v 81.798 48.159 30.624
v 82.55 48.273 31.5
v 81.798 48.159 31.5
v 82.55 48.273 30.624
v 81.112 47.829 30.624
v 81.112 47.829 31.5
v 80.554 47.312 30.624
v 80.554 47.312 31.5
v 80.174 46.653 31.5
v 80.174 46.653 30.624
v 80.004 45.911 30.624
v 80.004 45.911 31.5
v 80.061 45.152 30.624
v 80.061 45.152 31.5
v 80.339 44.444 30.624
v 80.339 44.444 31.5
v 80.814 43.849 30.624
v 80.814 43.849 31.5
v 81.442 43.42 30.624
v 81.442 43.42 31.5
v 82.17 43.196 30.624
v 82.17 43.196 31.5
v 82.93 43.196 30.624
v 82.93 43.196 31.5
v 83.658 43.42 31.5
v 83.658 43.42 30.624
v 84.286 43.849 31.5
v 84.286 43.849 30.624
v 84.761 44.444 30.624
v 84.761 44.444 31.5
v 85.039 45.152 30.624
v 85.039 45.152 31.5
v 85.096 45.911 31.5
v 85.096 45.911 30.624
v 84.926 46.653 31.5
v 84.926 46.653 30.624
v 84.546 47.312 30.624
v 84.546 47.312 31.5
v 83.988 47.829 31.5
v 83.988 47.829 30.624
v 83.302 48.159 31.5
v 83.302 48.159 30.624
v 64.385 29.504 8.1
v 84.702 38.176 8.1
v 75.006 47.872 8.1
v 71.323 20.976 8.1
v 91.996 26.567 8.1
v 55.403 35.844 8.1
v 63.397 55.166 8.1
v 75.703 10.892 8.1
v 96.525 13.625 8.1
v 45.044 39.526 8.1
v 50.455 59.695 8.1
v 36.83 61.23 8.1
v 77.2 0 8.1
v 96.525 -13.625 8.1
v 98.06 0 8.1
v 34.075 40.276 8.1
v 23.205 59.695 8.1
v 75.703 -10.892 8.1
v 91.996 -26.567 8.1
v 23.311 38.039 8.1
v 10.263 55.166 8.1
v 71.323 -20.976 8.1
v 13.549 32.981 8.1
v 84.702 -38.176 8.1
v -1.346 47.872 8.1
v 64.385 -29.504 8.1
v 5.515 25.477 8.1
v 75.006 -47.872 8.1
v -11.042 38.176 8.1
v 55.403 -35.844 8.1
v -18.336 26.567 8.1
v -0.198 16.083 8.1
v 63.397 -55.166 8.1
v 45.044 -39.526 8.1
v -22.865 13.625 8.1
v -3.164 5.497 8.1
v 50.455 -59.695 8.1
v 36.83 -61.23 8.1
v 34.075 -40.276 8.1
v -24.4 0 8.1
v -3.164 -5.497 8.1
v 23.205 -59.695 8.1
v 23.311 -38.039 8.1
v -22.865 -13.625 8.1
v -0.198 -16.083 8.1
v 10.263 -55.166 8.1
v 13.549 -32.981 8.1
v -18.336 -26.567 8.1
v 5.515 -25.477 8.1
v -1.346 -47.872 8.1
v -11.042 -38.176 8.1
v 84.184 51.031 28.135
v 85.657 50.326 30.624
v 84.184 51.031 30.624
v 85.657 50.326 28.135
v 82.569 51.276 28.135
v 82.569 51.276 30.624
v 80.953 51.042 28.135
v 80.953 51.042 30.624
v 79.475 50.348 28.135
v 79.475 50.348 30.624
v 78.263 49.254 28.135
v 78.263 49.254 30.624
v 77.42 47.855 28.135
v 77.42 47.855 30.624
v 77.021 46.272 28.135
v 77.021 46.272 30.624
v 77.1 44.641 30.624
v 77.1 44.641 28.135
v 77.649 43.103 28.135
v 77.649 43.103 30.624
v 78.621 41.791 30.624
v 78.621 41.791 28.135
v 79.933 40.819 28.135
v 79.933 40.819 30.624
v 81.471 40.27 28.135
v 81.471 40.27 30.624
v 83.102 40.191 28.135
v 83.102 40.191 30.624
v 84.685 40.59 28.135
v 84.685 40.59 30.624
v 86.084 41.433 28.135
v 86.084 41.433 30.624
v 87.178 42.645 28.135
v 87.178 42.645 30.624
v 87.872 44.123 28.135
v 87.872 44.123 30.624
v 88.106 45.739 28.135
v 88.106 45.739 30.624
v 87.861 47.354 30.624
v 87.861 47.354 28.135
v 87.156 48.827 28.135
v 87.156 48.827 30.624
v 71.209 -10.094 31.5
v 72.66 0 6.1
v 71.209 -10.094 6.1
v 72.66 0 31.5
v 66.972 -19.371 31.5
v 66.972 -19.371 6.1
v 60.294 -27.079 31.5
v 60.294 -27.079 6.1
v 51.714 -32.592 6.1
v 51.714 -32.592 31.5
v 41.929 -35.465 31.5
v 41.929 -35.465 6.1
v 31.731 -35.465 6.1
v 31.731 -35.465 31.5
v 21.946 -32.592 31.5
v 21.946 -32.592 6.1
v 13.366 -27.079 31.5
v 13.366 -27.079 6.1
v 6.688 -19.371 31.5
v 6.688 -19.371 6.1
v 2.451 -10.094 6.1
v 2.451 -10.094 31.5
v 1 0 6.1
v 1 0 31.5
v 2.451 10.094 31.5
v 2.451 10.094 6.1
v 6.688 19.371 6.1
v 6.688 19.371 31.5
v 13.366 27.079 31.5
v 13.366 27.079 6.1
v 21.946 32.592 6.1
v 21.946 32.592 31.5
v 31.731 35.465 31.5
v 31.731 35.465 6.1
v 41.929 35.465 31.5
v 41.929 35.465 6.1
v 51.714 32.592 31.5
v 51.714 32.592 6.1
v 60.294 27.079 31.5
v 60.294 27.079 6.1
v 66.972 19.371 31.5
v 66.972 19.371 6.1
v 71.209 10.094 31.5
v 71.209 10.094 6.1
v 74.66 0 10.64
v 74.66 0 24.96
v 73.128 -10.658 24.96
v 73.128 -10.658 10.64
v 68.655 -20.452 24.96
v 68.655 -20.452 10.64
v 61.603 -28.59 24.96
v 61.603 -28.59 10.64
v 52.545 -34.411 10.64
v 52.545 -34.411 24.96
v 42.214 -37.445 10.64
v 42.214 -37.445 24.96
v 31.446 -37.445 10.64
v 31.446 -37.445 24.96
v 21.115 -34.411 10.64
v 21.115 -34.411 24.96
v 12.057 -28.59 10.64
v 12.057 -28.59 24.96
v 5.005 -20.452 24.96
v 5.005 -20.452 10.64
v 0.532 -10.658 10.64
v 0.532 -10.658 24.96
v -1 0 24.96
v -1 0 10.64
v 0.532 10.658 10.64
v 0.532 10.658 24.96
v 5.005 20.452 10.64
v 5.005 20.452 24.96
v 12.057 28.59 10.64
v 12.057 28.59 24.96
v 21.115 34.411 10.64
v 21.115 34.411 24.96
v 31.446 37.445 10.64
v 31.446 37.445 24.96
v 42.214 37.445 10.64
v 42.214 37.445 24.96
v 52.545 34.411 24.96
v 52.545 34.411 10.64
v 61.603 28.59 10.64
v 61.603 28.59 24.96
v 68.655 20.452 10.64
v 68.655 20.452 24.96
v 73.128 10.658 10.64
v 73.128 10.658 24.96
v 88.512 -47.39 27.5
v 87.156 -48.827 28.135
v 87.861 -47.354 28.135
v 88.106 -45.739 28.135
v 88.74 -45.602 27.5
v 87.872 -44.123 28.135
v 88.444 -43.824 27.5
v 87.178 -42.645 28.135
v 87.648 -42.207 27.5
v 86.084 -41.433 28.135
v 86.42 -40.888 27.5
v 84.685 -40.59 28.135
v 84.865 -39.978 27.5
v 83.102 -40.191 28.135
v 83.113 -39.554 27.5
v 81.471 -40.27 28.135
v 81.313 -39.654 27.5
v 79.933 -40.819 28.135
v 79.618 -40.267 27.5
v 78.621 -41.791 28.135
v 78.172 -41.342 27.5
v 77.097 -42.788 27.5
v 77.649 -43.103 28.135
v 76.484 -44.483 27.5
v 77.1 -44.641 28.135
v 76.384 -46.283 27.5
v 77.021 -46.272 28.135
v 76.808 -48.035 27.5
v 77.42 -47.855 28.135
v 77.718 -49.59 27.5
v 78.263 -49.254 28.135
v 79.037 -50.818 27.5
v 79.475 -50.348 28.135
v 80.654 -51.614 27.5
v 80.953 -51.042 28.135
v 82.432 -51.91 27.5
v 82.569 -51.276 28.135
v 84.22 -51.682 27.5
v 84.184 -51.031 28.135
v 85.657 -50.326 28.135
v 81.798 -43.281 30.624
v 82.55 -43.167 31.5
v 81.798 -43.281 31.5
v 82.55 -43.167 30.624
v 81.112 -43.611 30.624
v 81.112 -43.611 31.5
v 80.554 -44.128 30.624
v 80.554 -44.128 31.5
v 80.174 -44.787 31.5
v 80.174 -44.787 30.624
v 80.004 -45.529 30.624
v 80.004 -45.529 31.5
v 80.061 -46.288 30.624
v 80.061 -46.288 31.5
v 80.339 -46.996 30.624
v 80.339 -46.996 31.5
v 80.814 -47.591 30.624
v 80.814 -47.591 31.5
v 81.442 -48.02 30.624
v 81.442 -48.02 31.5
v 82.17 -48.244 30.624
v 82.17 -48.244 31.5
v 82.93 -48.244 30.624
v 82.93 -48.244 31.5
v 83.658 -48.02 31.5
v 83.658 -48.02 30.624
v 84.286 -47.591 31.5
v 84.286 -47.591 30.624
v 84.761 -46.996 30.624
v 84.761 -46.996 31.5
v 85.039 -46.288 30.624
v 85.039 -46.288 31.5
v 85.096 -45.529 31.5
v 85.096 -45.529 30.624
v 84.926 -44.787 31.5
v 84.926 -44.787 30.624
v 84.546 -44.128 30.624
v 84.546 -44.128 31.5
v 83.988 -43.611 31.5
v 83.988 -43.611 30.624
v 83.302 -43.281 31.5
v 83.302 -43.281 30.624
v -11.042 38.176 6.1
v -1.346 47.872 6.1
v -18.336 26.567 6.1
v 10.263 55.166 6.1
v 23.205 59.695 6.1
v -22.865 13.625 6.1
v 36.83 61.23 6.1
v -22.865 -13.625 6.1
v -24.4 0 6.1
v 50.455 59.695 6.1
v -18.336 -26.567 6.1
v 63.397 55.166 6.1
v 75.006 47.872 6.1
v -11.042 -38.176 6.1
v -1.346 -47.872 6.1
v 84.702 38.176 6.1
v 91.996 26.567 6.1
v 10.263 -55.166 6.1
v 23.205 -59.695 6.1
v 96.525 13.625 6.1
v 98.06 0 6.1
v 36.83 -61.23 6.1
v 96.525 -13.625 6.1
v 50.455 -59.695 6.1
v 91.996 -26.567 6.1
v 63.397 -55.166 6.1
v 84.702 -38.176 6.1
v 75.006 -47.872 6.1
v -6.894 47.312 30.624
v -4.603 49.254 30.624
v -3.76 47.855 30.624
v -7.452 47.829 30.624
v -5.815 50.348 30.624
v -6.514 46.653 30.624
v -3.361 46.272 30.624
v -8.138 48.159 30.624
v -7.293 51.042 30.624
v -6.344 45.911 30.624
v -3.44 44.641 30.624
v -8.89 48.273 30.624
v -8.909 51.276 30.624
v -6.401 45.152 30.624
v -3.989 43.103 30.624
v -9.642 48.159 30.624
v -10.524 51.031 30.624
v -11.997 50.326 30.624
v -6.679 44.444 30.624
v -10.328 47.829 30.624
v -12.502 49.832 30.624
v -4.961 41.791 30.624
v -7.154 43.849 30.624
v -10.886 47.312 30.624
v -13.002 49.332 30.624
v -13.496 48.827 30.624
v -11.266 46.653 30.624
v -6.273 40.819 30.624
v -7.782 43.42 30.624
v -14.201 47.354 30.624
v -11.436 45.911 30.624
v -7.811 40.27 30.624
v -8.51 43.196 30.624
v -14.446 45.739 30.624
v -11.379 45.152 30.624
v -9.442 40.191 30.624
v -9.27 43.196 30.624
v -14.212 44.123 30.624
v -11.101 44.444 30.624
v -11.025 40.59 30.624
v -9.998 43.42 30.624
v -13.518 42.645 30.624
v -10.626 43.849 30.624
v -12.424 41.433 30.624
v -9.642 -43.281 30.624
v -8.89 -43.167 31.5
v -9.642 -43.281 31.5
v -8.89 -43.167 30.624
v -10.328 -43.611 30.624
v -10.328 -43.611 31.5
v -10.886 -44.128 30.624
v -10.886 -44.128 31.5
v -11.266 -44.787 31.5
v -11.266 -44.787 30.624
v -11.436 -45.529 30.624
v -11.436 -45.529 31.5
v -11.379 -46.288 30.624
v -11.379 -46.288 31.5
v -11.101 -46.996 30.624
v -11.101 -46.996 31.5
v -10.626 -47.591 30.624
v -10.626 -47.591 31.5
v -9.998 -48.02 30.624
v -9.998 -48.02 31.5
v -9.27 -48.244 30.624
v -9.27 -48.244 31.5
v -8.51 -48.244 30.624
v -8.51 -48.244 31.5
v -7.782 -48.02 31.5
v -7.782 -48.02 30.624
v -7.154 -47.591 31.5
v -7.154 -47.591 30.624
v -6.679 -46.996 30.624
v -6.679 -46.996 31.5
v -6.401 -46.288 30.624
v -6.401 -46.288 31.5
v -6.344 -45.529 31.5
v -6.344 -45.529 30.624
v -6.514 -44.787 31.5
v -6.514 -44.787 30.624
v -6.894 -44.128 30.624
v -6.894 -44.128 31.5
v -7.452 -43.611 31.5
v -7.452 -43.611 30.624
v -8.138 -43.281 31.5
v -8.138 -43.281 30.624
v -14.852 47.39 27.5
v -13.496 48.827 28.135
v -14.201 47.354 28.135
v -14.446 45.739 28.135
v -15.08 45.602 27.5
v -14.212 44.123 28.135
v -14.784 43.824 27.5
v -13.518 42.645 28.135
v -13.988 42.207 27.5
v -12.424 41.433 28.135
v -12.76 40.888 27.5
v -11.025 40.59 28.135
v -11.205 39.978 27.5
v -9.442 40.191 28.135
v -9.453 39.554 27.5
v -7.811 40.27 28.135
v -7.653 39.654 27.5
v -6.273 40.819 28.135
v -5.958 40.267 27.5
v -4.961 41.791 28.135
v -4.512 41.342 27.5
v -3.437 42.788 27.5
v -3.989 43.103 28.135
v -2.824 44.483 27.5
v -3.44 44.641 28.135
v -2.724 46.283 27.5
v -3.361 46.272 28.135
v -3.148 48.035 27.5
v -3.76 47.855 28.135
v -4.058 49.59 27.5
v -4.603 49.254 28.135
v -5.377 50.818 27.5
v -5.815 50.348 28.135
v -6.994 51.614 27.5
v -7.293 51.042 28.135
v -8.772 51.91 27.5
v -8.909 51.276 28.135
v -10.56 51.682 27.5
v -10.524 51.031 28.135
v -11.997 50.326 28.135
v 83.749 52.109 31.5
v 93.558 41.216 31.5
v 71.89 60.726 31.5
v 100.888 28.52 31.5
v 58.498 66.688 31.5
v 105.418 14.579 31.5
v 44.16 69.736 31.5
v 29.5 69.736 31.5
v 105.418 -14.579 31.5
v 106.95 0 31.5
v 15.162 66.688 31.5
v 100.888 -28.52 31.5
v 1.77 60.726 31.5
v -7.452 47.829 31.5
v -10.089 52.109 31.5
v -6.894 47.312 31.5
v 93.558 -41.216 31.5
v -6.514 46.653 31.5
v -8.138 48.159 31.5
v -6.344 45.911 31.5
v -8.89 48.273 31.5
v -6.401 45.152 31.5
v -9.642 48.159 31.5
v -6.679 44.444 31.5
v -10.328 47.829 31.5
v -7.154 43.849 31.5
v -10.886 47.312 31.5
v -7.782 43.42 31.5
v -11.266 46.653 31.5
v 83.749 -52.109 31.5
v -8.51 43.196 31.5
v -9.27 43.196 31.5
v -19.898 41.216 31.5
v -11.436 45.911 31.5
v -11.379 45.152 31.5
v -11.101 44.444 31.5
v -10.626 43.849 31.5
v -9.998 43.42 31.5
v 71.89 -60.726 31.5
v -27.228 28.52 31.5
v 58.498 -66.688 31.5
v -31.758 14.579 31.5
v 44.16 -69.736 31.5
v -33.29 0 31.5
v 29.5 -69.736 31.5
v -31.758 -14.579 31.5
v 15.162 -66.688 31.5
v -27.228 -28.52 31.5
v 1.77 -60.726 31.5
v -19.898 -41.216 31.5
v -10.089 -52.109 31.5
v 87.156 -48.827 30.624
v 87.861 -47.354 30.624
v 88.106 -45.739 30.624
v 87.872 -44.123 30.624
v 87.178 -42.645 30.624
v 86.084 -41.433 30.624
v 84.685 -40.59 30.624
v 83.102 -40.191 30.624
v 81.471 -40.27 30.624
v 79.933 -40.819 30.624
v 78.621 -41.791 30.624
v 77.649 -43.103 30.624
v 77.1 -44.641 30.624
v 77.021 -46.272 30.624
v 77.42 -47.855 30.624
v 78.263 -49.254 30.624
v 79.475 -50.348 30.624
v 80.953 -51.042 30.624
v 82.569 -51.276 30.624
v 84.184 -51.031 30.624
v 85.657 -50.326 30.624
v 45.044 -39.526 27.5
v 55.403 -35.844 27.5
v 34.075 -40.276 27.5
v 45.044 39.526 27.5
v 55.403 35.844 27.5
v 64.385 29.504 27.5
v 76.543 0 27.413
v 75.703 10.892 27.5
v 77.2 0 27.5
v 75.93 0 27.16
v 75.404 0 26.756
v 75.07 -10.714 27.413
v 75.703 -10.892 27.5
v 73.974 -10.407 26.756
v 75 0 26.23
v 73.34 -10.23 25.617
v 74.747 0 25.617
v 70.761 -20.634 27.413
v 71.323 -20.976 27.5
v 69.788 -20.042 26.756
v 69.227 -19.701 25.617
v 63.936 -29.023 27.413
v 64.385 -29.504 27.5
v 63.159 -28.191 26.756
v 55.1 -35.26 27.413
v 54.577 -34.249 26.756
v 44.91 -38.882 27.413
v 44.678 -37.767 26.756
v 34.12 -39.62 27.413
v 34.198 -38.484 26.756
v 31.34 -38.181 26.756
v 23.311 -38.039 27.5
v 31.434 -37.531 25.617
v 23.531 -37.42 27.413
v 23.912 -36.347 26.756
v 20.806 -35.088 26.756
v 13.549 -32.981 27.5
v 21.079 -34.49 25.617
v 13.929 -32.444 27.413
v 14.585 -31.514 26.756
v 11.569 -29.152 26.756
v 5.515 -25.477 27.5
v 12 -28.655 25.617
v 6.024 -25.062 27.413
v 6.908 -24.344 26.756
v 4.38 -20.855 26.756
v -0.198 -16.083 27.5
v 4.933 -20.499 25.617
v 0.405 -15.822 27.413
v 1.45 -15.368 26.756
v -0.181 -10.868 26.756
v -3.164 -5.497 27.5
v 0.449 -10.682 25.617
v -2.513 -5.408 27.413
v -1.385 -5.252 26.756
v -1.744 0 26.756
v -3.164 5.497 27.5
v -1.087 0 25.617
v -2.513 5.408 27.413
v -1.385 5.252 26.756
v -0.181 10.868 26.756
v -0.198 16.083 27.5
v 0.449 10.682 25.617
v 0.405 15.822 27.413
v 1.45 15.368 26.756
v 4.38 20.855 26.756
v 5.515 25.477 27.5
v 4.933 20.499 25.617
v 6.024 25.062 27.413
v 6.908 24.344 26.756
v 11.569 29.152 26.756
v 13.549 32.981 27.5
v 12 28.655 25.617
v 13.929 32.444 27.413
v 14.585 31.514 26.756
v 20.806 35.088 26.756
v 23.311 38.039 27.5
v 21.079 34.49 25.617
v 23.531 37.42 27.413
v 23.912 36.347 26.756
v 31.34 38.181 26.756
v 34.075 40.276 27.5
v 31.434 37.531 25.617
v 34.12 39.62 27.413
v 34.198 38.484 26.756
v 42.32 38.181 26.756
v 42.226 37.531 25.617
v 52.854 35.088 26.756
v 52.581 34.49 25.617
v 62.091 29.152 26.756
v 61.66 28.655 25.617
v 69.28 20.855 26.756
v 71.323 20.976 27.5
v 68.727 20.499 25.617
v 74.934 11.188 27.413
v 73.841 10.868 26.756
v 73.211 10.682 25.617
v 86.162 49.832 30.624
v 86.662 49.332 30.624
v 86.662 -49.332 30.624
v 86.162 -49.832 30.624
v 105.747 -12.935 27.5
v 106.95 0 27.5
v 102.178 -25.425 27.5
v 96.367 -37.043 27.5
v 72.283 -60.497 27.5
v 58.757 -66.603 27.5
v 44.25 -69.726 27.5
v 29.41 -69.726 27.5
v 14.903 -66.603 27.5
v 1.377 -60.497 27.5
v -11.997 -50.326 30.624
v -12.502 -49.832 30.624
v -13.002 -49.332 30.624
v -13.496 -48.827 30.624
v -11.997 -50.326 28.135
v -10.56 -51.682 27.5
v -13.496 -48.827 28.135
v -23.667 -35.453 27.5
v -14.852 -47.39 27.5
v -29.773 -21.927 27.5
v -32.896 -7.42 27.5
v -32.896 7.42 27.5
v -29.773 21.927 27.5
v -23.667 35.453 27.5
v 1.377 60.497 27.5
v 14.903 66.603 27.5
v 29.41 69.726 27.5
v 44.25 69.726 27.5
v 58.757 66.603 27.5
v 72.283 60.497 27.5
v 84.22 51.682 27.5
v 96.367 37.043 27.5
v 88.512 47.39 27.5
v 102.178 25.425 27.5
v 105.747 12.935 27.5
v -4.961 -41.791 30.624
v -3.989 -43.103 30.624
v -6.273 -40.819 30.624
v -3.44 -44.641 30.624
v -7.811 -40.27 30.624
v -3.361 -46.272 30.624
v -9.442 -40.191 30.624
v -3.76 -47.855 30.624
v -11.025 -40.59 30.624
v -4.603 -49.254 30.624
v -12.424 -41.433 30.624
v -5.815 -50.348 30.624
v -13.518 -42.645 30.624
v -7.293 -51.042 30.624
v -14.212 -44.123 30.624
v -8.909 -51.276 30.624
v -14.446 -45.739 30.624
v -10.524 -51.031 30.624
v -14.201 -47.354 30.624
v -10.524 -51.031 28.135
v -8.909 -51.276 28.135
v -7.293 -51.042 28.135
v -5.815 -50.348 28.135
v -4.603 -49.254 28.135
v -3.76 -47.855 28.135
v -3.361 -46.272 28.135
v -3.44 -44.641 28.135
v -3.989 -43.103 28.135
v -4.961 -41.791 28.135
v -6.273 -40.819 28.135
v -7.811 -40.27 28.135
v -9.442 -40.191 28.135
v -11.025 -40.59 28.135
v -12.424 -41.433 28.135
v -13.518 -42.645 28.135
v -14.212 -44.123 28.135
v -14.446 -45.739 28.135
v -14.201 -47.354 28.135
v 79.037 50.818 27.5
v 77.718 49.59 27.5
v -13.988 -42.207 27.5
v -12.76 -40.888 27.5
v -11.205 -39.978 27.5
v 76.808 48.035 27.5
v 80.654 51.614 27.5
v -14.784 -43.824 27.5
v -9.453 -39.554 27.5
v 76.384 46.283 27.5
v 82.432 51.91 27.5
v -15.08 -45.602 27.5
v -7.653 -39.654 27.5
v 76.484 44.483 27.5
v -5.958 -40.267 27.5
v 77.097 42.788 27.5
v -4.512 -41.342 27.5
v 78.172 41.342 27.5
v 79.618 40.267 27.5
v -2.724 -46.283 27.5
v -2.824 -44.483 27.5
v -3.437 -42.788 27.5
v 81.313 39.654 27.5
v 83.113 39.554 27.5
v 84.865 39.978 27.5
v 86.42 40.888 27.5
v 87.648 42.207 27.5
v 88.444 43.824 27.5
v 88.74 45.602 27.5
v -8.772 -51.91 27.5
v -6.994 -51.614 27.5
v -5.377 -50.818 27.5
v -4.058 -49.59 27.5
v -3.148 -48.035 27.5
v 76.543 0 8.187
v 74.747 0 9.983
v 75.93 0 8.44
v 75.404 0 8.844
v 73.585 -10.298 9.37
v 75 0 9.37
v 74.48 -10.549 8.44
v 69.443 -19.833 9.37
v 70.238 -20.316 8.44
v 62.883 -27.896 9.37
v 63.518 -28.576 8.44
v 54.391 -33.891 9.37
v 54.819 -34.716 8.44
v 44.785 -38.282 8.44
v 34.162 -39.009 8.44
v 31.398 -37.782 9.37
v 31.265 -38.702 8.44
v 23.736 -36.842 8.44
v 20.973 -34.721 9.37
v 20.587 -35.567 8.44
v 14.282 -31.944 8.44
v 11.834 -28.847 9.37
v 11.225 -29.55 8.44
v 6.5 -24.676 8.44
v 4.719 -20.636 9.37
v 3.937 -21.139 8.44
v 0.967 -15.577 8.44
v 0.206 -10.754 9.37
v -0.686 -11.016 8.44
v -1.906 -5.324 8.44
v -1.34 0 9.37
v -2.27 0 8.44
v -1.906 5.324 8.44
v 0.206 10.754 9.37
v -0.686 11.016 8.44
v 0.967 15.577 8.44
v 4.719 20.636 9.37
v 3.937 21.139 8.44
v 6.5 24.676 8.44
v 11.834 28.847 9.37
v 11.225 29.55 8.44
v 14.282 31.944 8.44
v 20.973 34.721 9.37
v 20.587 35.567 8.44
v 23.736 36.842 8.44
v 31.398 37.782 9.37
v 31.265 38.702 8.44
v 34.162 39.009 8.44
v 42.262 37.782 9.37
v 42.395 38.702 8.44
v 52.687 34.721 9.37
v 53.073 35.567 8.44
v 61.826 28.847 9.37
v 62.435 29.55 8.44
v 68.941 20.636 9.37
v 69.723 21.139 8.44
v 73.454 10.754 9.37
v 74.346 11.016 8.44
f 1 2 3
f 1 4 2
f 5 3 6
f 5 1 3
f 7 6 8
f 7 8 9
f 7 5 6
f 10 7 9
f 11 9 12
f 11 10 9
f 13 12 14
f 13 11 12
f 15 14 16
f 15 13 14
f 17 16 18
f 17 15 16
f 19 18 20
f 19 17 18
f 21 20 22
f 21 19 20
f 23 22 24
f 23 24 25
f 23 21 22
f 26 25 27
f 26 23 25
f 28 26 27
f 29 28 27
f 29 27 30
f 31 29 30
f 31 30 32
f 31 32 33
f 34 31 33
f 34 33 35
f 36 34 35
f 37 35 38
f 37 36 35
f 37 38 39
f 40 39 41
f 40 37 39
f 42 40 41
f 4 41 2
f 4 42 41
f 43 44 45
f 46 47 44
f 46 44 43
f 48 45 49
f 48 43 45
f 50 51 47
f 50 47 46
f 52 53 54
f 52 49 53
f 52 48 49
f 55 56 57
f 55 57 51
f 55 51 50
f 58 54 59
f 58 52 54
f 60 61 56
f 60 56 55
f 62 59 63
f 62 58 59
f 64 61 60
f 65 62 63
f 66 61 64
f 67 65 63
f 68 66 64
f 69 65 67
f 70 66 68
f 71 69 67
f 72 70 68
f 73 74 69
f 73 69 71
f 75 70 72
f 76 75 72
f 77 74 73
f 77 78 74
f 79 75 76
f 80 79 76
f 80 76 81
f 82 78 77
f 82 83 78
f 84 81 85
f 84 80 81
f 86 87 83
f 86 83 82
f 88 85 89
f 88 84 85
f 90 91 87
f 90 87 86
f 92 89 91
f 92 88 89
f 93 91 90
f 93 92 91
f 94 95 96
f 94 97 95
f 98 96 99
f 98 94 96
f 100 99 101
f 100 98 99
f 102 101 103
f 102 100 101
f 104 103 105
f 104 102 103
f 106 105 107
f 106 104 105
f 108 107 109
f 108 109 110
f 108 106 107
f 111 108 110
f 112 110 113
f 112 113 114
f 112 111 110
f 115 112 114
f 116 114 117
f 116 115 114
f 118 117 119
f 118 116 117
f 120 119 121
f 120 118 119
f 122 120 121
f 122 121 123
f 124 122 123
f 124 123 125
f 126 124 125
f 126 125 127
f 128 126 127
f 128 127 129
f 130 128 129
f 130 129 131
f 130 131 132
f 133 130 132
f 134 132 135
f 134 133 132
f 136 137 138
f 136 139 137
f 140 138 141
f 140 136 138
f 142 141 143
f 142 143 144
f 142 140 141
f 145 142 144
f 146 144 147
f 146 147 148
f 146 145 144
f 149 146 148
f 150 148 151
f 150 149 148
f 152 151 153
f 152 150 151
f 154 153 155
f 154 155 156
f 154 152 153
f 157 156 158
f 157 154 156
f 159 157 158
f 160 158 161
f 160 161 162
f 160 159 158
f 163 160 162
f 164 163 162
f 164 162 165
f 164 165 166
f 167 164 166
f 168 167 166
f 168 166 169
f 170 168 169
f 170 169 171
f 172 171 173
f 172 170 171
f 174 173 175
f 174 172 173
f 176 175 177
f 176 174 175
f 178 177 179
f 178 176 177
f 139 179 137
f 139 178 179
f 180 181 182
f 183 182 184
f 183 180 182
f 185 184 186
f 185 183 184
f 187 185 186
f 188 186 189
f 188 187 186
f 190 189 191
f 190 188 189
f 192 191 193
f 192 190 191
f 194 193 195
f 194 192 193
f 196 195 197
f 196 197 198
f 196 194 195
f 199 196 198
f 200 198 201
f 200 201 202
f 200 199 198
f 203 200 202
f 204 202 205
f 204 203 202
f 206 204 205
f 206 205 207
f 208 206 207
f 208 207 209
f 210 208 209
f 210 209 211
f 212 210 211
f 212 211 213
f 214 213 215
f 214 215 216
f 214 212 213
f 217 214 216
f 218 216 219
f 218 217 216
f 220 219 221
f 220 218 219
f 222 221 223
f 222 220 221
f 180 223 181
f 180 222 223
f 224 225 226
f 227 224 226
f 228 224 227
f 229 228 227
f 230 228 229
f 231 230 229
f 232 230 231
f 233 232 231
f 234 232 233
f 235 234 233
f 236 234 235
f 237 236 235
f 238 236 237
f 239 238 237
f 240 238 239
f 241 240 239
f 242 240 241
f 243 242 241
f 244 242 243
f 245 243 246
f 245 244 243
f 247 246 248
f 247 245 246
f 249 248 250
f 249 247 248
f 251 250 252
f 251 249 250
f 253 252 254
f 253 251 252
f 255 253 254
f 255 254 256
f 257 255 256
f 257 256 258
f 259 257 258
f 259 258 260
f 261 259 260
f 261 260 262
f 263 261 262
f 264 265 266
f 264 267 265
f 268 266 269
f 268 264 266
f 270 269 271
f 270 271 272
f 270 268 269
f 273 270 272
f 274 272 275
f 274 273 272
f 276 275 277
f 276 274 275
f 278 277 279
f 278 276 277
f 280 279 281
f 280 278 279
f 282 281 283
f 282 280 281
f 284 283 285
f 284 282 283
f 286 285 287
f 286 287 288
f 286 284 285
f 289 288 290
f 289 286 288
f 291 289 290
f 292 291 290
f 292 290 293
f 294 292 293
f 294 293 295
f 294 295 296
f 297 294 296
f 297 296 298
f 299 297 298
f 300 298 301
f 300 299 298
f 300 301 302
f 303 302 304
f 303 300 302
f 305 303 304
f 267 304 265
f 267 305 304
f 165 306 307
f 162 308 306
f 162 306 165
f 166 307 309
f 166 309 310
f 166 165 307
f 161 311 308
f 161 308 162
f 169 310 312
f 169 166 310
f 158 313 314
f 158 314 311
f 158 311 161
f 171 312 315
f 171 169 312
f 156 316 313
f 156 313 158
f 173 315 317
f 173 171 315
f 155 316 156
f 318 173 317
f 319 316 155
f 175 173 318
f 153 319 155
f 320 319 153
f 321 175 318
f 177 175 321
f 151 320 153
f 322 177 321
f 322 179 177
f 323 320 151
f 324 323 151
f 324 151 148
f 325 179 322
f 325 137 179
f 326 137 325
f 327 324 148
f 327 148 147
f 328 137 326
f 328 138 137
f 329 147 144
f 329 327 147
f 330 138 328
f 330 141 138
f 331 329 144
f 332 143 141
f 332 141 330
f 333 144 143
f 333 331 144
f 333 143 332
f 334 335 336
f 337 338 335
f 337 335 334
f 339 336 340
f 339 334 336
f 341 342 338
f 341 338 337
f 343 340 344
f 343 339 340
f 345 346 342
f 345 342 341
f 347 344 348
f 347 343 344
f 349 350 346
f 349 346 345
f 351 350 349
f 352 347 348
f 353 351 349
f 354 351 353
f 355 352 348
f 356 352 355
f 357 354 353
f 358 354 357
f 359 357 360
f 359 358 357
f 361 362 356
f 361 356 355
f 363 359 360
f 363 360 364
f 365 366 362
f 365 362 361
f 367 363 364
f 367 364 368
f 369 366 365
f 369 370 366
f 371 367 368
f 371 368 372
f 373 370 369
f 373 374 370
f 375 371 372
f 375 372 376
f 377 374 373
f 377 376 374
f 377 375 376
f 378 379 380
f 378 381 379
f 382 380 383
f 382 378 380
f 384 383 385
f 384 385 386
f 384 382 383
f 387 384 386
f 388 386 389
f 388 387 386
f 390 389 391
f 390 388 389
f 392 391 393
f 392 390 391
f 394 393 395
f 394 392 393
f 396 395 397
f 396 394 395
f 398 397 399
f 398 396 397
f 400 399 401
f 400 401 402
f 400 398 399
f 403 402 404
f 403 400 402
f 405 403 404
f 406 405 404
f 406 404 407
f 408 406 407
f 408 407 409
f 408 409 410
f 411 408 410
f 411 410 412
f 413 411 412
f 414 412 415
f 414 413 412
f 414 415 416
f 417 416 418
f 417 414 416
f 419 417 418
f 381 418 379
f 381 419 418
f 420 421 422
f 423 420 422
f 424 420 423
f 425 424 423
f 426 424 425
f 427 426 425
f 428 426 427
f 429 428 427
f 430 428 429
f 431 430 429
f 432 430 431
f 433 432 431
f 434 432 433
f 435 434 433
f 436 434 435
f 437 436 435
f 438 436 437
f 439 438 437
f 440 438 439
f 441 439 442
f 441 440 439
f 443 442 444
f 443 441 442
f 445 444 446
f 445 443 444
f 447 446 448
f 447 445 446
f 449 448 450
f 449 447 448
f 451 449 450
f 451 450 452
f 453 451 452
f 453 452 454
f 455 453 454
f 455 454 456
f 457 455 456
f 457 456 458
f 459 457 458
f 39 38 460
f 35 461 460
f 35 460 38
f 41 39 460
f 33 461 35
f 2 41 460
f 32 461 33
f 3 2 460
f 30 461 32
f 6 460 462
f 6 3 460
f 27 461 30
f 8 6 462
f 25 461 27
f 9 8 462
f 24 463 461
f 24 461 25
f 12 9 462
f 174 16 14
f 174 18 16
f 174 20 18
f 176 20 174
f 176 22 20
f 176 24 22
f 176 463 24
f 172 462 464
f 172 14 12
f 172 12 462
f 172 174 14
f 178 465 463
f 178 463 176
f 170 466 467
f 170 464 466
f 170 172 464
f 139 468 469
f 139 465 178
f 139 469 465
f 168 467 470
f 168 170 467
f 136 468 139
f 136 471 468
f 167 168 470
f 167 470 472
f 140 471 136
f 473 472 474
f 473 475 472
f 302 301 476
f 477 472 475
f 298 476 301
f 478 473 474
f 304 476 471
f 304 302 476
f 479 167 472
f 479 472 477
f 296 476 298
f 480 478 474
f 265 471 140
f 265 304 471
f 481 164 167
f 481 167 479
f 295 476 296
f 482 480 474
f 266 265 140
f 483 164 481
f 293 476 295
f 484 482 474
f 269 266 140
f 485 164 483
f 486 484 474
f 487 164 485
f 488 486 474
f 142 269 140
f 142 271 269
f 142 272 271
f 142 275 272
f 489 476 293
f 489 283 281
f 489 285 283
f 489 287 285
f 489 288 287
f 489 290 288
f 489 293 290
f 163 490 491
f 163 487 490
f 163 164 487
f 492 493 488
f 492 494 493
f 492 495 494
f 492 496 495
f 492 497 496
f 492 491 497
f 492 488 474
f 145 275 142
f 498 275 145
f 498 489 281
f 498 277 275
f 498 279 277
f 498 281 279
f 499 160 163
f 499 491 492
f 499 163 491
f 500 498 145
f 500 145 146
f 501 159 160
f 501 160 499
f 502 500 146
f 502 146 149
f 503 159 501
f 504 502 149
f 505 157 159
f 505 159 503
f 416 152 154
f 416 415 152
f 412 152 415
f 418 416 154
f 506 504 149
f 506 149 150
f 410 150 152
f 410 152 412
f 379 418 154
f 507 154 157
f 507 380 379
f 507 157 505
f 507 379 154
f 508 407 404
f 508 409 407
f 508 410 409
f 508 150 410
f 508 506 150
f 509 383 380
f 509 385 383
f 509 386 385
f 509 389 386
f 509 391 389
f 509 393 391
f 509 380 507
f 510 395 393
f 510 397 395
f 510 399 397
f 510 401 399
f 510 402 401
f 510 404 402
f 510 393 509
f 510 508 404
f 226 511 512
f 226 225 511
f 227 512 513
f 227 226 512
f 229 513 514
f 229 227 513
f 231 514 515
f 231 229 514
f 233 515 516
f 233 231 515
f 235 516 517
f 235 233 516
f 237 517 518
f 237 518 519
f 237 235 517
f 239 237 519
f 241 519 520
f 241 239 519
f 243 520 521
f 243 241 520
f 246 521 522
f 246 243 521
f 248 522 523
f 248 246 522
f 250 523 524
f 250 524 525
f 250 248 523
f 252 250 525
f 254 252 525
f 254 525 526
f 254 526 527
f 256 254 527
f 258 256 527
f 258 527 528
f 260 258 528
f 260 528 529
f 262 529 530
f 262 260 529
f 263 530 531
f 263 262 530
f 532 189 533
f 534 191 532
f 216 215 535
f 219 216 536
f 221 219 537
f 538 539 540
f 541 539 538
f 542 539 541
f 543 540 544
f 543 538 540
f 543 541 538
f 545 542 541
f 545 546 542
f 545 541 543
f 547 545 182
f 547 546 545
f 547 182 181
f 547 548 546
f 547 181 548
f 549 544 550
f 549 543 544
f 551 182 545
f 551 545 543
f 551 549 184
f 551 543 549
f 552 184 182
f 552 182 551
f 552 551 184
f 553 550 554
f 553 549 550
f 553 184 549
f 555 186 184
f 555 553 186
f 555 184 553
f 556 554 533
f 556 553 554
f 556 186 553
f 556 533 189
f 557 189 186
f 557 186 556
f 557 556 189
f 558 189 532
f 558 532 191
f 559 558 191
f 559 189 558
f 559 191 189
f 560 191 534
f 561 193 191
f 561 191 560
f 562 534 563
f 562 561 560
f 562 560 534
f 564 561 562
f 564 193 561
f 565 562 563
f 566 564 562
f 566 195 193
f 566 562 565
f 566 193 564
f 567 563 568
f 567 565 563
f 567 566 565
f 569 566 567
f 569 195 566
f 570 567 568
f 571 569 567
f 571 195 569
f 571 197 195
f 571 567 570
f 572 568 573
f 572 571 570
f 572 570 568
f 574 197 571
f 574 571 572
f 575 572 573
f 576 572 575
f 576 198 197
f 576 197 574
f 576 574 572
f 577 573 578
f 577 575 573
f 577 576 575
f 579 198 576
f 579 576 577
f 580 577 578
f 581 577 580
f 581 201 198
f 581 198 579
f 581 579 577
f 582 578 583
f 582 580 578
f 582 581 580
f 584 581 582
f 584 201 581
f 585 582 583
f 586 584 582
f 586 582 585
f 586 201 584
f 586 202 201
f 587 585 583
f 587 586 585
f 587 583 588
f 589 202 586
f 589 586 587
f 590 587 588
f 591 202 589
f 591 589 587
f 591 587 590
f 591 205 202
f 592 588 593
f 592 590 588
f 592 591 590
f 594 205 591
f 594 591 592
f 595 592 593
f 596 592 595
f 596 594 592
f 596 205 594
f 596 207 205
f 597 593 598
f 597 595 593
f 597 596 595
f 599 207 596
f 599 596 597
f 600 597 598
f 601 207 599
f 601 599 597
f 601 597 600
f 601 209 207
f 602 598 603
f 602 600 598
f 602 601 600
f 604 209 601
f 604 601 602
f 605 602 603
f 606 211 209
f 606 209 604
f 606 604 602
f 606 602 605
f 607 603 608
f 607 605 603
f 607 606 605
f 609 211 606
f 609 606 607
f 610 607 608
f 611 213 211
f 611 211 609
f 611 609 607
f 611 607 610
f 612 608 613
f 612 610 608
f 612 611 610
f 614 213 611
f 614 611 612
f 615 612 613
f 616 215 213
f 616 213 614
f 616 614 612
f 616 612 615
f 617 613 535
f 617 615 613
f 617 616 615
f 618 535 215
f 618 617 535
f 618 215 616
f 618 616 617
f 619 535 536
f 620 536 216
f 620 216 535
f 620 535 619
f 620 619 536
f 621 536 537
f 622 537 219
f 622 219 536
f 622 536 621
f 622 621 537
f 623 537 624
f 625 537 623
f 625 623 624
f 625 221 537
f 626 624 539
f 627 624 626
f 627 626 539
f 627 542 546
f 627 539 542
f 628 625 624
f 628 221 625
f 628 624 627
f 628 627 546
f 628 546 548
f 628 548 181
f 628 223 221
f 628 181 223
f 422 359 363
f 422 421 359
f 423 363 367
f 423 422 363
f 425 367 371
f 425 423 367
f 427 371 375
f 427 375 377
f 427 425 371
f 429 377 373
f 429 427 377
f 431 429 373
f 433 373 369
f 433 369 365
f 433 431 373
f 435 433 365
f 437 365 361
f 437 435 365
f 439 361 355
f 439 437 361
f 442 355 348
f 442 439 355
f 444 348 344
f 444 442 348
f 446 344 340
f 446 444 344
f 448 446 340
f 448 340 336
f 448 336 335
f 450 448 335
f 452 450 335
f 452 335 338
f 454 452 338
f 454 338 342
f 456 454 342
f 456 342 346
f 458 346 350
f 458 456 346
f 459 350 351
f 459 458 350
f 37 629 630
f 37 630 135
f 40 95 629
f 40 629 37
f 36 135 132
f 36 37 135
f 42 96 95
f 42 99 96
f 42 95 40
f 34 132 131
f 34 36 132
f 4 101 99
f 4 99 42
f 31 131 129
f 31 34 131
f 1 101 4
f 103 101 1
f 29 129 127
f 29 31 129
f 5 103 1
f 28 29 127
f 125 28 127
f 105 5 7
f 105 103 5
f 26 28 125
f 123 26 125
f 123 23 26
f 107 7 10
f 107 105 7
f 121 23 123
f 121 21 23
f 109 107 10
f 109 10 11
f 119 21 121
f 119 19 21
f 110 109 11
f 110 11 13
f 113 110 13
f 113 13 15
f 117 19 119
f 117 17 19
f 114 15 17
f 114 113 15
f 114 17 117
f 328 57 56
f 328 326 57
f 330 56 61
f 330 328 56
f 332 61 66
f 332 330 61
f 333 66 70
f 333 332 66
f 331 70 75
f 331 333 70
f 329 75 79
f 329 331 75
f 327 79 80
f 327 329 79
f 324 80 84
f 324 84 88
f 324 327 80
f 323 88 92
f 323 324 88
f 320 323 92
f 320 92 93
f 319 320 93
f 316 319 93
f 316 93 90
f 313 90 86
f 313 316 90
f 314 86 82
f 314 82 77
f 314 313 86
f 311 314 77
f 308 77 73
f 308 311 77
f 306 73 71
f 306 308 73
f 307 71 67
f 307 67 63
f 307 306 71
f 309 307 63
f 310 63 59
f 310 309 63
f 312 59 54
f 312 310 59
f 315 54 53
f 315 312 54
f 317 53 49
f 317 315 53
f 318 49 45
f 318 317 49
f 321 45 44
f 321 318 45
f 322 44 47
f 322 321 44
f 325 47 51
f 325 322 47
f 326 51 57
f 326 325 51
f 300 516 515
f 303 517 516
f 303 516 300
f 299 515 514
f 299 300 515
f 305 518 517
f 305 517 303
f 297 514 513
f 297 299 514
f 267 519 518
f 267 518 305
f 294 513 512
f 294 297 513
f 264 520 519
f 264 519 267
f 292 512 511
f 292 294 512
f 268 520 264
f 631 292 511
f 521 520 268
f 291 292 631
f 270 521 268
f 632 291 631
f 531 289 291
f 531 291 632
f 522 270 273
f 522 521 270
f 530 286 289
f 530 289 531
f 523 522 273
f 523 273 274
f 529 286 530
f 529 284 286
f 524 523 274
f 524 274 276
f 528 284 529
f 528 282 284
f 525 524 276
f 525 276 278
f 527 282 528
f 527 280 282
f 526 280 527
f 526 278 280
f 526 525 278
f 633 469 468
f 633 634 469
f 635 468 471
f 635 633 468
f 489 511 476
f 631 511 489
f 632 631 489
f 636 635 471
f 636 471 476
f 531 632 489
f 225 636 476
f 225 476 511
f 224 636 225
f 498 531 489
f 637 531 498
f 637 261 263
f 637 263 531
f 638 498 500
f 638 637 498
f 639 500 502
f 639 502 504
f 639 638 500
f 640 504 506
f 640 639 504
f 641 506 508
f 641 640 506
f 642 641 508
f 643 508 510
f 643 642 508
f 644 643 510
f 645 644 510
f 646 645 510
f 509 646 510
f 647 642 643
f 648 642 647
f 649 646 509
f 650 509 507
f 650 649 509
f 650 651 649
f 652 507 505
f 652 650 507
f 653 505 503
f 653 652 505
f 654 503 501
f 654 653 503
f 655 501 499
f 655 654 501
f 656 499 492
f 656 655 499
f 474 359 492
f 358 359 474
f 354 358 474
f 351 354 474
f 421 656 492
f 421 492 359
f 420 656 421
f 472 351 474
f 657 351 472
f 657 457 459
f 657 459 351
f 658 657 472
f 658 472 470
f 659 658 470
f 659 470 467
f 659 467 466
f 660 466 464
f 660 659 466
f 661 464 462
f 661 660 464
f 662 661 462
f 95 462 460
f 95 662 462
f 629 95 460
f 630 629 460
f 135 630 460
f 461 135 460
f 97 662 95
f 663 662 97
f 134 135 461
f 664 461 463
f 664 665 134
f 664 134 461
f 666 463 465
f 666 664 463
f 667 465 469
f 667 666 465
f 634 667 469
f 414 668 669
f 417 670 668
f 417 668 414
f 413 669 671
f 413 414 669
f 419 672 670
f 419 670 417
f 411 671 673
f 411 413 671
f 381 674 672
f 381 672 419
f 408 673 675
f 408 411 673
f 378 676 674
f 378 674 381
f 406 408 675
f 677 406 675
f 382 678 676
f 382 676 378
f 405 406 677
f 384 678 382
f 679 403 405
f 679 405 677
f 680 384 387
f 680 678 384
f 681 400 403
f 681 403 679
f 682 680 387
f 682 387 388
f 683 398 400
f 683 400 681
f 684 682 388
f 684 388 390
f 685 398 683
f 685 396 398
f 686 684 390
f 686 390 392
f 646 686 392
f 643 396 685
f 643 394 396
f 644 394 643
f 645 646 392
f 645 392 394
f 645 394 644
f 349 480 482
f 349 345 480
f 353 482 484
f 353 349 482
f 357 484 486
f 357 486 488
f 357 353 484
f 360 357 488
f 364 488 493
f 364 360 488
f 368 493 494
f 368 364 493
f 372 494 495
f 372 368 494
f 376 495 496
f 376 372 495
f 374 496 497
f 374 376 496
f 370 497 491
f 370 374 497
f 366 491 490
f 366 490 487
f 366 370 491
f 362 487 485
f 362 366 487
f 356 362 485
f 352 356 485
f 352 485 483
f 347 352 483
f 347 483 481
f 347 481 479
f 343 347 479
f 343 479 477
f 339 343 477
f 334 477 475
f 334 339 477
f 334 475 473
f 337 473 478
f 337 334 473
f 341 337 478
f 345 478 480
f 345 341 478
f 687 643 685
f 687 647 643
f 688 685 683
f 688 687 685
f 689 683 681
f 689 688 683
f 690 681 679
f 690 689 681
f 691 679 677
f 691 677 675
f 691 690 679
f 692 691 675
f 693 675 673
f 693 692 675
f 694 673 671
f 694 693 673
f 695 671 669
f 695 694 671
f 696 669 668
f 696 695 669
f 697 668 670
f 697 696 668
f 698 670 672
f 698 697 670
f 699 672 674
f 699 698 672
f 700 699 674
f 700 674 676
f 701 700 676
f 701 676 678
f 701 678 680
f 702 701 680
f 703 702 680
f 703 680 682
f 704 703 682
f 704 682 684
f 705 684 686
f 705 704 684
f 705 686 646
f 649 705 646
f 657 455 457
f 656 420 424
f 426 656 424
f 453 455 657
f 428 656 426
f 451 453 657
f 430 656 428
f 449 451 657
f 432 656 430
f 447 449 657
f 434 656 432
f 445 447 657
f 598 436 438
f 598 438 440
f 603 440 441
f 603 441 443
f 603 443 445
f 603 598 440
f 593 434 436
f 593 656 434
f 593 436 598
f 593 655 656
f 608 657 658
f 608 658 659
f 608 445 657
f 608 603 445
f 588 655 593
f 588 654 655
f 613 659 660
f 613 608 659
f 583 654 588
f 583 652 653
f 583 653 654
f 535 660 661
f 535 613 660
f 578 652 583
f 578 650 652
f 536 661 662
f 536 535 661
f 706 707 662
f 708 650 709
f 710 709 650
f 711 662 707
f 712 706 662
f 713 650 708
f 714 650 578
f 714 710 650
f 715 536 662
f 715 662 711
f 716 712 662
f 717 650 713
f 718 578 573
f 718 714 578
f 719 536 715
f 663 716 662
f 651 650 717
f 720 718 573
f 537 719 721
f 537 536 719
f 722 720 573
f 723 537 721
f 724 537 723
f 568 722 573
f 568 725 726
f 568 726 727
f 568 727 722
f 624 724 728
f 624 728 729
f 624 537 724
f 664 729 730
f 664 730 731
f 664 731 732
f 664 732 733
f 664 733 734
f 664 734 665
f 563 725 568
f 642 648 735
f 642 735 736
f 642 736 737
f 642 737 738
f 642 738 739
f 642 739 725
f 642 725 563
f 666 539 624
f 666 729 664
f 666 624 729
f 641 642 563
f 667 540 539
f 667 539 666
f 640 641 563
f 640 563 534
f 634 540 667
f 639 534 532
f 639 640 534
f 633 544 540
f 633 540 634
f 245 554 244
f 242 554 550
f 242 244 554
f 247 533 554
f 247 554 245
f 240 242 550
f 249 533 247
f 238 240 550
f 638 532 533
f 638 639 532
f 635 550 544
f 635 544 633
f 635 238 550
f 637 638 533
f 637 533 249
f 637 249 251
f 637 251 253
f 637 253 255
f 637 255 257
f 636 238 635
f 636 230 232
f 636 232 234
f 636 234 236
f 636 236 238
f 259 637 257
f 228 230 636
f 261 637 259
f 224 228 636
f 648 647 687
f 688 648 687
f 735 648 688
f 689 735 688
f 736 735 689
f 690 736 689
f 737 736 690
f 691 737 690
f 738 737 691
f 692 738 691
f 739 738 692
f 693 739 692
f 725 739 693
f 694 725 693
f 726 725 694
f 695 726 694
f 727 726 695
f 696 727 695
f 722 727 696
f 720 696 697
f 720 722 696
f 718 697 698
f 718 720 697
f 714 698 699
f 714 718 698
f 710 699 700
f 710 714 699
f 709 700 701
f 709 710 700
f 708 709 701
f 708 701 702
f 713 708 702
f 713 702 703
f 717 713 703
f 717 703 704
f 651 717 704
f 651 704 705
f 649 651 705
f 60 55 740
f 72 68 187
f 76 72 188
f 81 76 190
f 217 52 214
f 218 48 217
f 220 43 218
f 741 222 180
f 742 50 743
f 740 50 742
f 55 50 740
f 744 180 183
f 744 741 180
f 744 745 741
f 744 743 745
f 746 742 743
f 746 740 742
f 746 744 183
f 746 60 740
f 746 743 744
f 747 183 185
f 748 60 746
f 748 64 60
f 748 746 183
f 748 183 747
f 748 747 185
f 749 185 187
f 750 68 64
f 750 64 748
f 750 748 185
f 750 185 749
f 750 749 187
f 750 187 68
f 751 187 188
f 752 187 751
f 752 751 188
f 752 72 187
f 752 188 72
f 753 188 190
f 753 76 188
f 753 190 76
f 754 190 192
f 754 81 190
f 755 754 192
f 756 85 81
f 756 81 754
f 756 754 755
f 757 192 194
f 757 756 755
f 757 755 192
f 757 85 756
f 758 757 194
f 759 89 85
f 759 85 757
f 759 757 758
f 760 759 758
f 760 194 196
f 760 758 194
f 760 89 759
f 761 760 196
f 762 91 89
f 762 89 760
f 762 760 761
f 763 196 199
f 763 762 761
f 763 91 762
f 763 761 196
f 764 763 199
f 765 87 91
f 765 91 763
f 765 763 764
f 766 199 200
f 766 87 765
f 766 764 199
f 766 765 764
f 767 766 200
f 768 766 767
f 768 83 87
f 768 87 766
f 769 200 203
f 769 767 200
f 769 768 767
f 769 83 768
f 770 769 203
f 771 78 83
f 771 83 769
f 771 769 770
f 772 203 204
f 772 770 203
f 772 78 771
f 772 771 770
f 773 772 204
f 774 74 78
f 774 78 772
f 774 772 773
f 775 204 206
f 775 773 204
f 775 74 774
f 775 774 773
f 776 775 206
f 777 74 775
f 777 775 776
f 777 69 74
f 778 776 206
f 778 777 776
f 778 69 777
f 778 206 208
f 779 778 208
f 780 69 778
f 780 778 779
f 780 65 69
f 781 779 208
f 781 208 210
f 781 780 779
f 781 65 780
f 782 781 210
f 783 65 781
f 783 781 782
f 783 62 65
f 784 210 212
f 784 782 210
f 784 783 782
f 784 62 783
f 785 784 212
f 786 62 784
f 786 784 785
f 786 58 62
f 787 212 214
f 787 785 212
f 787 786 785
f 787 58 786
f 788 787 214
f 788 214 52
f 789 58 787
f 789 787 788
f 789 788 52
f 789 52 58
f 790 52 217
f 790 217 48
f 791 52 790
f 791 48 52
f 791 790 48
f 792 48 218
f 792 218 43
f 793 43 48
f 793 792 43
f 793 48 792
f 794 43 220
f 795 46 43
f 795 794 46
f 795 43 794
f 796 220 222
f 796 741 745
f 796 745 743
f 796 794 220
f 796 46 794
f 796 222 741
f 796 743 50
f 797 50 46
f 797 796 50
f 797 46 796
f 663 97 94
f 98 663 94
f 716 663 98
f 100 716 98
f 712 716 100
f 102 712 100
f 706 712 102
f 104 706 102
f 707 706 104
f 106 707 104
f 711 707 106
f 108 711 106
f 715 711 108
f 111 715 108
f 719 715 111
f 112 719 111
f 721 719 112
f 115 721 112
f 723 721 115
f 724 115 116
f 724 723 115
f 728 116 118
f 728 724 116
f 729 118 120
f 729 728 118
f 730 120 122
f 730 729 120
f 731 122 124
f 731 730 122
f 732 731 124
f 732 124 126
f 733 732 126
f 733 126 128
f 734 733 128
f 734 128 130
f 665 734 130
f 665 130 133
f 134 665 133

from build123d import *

# Parameters (mm, degrees)
CBORE_FOR_10_BINDING_HEAD_MACHINE_S_2_COUNT = 2
CBORE_FOR_10_BINDING_HEAD_MACHINE_S_2_PITCH = 91.44
CBORE_FOR_10_BINDING_HEAD_MACHINE_S_3_COUNT = 2
CBORE_FOR_10_BINDING_HEAD_MACHINE_S_3_PITCH = 129.315688143
CBORE_FOR_10_BINDING_HEAD_MACHINE_S_4_COUNT = 2
CBORE_FOR_10_BINDING_HEAD_MACHINE_S_4_PITCH = 91.44


with BuildPart() as part:
    # Sketch1 → Revolve1 (revolve)
    with BuildSketch(Plane(origin=(0, 0, 0), x_dir=(1, 0, 0), z_dir=(0, 1, 0)), mode=Mode.PRIVATE) as revolve1_sk:
        with BuildLine():
            Line((-1.000000064, -24.96), (-1.000000064, -10.640000064))
            ThreePointArc((-1.000000064, -10.640000064), (-1.74394884, -8.84394884), (-3.540000064, -8.100000064))
            Line((-3.540000064, -8.100000064), (-24.4, -8.100000064))
            Line((-24.4, -8.100000064), (-24.4, -6.100000064))
            Line((-24.4, -6.100000064), (-1, -6.100000064))
            Line((-1, -6.100000064), (1, -6.100000064))
            Line((1, -6.100000064), (1, -31.500000128))
            Line((1, -31.500000128), (-33.29, -31.500000128))
            Line((-33.29, -31.500000128), (-33.29, -27.5))
            Line((-33.29, -27.5), (-3.540000064, -27.5))
            ThreePointArc((-3.540000064, -27.5), (-1.74394884, -26.756051224), (-1.000000064, -24.96))
        make_face()
    revolve(revolve1_sk.sketch.rotate(Axis((36.83, 0, 32.45), (0, 0, -1)), 180), axis=Axis((36.83, 0, 32.45), (0, 0, -1)))

    # Sketch7 → CBORE for #10 Binding Head Machine Screw1 (revolve, cut)
    with BuildSketch(Plane(origin=(82.55, 45.72, 27.5), x_dir=(0, 1, 0), z_dir=(1, 0, 0))):
        Polygon((0, 0), (0, 4.000000128), (2.5527, 4.000000128), (2.5527, 3.1242), (5.55625, 3.1242), (5.55625, 0.635), (6.19125, 0), align=None)
    cbore_for_10_binding_head_machine_screw = revolve(axis=Axis((82.55, 45.72, 21.15), (0, 0, 1)), mode=Mode.SUBTRACT)

    # CBORE for _10 Binding Head Machine S 2: CBORE for #10 Binding Head Machine Screw1 ×2
    with Locations(*[(-i * CBORE_FOR_10_BINDING_HEAD_MACHINE_S_2_PITCH, 0, 0) for i in range(1, CBORE_FOR_10_BINDING_HEAD_MACHINE_S_2_COUNT)]):
        add(cbore_for_10_binding_head_machine_screw, mode=Mode.SUBTRACT)

    # CBORE for _10 Binding Head Machine S 3: CBORE for #10 Binding Head Machine Screw1 ×2
    with Locations(*[Vector(-0.7071067811865476, -0.7071067811865476, 0) * (i * CBORE_FOR_10_BINDING_HEAD_MACHINE_S_3_PITCH) for i in range(1, CBORE_FOR_10_BINDING_HEAD_MACHINE_S_3_COUNT)]):
        add(cbore_for_10_binding_head_machine_screw, mode=Mode.SUBTRACT)

    # CBORE for _10 Binding Head Machine S 4: CBORE for #10 Binding Head Machine Screw1 ×2
    with Locations(*[(0, -i * CBORE_FOR_10_BINDING_HEAD_MACHINE_S_4_PITCH, 0) for i in range(1, CBORE_FOR_10_BINDING_HEAD_MACHINE_S_4_COUNT)]):
        add(cbore_for_10_binding_head_machine_screw, mode=Mode.SUBTRACT)


solid = part.part
